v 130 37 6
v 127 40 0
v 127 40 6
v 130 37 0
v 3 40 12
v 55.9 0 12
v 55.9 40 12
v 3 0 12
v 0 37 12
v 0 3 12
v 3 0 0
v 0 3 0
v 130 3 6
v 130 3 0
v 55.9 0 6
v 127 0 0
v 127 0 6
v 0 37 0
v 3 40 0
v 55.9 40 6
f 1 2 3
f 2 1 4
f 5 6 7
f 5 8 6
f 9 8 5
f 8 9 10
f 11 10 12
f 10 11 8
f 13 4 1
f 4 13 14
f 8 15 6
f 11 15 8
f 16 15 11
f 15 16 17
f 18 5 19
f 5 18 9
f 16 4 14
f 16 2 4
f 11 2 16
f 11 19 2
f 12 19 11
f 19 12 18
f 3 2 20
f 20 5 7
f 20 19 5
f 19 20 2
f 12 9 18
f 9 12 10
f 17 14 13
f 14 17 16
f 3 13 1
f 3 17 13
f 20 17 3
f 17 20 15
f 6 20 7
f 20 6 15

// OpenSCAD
$fn = 32;

// ----------------------------------------------------------------------
// Stepped bar: endstep, 130 x 40 x 12/6 mm
// ----------------------------------------------------------------------

// --- parameters (mm) ---
bar_l = 130;              // bar length, X
bar_w = 40;               // bar width, Y
plate_t = 12;             // thickness of the thick zone, Z
thin_t = 6;               // thickness of the thin zone
corner_c = 3;             // corner chamfer of the bar
step_cut = 6;             // material removed from the thin zone
step_x = 55.9;            // step position from the left end
depth_1 = 6;              // depth of cut 1 from the top face

profile = [[3, 0], [127, 0], [130, 3], [130, 37], [127, 40], [3, 40], [0, 37], [0, 3]];  // primary outline, 8 points, counter clockwise
void_1 = [[55.9, -1], [131, -1], [131, 41], [55.9, 41]];  // thin zone beyond the step, 4 points

// --- the one profile operation ---
difference() {
  linear_extrude(height = plate_t) polygon(points = profile);
  translate([0, 0, plate_t - depth_1])
    linear_extrude(height = depth_1 + 1) polygon(points = void_1);
}
